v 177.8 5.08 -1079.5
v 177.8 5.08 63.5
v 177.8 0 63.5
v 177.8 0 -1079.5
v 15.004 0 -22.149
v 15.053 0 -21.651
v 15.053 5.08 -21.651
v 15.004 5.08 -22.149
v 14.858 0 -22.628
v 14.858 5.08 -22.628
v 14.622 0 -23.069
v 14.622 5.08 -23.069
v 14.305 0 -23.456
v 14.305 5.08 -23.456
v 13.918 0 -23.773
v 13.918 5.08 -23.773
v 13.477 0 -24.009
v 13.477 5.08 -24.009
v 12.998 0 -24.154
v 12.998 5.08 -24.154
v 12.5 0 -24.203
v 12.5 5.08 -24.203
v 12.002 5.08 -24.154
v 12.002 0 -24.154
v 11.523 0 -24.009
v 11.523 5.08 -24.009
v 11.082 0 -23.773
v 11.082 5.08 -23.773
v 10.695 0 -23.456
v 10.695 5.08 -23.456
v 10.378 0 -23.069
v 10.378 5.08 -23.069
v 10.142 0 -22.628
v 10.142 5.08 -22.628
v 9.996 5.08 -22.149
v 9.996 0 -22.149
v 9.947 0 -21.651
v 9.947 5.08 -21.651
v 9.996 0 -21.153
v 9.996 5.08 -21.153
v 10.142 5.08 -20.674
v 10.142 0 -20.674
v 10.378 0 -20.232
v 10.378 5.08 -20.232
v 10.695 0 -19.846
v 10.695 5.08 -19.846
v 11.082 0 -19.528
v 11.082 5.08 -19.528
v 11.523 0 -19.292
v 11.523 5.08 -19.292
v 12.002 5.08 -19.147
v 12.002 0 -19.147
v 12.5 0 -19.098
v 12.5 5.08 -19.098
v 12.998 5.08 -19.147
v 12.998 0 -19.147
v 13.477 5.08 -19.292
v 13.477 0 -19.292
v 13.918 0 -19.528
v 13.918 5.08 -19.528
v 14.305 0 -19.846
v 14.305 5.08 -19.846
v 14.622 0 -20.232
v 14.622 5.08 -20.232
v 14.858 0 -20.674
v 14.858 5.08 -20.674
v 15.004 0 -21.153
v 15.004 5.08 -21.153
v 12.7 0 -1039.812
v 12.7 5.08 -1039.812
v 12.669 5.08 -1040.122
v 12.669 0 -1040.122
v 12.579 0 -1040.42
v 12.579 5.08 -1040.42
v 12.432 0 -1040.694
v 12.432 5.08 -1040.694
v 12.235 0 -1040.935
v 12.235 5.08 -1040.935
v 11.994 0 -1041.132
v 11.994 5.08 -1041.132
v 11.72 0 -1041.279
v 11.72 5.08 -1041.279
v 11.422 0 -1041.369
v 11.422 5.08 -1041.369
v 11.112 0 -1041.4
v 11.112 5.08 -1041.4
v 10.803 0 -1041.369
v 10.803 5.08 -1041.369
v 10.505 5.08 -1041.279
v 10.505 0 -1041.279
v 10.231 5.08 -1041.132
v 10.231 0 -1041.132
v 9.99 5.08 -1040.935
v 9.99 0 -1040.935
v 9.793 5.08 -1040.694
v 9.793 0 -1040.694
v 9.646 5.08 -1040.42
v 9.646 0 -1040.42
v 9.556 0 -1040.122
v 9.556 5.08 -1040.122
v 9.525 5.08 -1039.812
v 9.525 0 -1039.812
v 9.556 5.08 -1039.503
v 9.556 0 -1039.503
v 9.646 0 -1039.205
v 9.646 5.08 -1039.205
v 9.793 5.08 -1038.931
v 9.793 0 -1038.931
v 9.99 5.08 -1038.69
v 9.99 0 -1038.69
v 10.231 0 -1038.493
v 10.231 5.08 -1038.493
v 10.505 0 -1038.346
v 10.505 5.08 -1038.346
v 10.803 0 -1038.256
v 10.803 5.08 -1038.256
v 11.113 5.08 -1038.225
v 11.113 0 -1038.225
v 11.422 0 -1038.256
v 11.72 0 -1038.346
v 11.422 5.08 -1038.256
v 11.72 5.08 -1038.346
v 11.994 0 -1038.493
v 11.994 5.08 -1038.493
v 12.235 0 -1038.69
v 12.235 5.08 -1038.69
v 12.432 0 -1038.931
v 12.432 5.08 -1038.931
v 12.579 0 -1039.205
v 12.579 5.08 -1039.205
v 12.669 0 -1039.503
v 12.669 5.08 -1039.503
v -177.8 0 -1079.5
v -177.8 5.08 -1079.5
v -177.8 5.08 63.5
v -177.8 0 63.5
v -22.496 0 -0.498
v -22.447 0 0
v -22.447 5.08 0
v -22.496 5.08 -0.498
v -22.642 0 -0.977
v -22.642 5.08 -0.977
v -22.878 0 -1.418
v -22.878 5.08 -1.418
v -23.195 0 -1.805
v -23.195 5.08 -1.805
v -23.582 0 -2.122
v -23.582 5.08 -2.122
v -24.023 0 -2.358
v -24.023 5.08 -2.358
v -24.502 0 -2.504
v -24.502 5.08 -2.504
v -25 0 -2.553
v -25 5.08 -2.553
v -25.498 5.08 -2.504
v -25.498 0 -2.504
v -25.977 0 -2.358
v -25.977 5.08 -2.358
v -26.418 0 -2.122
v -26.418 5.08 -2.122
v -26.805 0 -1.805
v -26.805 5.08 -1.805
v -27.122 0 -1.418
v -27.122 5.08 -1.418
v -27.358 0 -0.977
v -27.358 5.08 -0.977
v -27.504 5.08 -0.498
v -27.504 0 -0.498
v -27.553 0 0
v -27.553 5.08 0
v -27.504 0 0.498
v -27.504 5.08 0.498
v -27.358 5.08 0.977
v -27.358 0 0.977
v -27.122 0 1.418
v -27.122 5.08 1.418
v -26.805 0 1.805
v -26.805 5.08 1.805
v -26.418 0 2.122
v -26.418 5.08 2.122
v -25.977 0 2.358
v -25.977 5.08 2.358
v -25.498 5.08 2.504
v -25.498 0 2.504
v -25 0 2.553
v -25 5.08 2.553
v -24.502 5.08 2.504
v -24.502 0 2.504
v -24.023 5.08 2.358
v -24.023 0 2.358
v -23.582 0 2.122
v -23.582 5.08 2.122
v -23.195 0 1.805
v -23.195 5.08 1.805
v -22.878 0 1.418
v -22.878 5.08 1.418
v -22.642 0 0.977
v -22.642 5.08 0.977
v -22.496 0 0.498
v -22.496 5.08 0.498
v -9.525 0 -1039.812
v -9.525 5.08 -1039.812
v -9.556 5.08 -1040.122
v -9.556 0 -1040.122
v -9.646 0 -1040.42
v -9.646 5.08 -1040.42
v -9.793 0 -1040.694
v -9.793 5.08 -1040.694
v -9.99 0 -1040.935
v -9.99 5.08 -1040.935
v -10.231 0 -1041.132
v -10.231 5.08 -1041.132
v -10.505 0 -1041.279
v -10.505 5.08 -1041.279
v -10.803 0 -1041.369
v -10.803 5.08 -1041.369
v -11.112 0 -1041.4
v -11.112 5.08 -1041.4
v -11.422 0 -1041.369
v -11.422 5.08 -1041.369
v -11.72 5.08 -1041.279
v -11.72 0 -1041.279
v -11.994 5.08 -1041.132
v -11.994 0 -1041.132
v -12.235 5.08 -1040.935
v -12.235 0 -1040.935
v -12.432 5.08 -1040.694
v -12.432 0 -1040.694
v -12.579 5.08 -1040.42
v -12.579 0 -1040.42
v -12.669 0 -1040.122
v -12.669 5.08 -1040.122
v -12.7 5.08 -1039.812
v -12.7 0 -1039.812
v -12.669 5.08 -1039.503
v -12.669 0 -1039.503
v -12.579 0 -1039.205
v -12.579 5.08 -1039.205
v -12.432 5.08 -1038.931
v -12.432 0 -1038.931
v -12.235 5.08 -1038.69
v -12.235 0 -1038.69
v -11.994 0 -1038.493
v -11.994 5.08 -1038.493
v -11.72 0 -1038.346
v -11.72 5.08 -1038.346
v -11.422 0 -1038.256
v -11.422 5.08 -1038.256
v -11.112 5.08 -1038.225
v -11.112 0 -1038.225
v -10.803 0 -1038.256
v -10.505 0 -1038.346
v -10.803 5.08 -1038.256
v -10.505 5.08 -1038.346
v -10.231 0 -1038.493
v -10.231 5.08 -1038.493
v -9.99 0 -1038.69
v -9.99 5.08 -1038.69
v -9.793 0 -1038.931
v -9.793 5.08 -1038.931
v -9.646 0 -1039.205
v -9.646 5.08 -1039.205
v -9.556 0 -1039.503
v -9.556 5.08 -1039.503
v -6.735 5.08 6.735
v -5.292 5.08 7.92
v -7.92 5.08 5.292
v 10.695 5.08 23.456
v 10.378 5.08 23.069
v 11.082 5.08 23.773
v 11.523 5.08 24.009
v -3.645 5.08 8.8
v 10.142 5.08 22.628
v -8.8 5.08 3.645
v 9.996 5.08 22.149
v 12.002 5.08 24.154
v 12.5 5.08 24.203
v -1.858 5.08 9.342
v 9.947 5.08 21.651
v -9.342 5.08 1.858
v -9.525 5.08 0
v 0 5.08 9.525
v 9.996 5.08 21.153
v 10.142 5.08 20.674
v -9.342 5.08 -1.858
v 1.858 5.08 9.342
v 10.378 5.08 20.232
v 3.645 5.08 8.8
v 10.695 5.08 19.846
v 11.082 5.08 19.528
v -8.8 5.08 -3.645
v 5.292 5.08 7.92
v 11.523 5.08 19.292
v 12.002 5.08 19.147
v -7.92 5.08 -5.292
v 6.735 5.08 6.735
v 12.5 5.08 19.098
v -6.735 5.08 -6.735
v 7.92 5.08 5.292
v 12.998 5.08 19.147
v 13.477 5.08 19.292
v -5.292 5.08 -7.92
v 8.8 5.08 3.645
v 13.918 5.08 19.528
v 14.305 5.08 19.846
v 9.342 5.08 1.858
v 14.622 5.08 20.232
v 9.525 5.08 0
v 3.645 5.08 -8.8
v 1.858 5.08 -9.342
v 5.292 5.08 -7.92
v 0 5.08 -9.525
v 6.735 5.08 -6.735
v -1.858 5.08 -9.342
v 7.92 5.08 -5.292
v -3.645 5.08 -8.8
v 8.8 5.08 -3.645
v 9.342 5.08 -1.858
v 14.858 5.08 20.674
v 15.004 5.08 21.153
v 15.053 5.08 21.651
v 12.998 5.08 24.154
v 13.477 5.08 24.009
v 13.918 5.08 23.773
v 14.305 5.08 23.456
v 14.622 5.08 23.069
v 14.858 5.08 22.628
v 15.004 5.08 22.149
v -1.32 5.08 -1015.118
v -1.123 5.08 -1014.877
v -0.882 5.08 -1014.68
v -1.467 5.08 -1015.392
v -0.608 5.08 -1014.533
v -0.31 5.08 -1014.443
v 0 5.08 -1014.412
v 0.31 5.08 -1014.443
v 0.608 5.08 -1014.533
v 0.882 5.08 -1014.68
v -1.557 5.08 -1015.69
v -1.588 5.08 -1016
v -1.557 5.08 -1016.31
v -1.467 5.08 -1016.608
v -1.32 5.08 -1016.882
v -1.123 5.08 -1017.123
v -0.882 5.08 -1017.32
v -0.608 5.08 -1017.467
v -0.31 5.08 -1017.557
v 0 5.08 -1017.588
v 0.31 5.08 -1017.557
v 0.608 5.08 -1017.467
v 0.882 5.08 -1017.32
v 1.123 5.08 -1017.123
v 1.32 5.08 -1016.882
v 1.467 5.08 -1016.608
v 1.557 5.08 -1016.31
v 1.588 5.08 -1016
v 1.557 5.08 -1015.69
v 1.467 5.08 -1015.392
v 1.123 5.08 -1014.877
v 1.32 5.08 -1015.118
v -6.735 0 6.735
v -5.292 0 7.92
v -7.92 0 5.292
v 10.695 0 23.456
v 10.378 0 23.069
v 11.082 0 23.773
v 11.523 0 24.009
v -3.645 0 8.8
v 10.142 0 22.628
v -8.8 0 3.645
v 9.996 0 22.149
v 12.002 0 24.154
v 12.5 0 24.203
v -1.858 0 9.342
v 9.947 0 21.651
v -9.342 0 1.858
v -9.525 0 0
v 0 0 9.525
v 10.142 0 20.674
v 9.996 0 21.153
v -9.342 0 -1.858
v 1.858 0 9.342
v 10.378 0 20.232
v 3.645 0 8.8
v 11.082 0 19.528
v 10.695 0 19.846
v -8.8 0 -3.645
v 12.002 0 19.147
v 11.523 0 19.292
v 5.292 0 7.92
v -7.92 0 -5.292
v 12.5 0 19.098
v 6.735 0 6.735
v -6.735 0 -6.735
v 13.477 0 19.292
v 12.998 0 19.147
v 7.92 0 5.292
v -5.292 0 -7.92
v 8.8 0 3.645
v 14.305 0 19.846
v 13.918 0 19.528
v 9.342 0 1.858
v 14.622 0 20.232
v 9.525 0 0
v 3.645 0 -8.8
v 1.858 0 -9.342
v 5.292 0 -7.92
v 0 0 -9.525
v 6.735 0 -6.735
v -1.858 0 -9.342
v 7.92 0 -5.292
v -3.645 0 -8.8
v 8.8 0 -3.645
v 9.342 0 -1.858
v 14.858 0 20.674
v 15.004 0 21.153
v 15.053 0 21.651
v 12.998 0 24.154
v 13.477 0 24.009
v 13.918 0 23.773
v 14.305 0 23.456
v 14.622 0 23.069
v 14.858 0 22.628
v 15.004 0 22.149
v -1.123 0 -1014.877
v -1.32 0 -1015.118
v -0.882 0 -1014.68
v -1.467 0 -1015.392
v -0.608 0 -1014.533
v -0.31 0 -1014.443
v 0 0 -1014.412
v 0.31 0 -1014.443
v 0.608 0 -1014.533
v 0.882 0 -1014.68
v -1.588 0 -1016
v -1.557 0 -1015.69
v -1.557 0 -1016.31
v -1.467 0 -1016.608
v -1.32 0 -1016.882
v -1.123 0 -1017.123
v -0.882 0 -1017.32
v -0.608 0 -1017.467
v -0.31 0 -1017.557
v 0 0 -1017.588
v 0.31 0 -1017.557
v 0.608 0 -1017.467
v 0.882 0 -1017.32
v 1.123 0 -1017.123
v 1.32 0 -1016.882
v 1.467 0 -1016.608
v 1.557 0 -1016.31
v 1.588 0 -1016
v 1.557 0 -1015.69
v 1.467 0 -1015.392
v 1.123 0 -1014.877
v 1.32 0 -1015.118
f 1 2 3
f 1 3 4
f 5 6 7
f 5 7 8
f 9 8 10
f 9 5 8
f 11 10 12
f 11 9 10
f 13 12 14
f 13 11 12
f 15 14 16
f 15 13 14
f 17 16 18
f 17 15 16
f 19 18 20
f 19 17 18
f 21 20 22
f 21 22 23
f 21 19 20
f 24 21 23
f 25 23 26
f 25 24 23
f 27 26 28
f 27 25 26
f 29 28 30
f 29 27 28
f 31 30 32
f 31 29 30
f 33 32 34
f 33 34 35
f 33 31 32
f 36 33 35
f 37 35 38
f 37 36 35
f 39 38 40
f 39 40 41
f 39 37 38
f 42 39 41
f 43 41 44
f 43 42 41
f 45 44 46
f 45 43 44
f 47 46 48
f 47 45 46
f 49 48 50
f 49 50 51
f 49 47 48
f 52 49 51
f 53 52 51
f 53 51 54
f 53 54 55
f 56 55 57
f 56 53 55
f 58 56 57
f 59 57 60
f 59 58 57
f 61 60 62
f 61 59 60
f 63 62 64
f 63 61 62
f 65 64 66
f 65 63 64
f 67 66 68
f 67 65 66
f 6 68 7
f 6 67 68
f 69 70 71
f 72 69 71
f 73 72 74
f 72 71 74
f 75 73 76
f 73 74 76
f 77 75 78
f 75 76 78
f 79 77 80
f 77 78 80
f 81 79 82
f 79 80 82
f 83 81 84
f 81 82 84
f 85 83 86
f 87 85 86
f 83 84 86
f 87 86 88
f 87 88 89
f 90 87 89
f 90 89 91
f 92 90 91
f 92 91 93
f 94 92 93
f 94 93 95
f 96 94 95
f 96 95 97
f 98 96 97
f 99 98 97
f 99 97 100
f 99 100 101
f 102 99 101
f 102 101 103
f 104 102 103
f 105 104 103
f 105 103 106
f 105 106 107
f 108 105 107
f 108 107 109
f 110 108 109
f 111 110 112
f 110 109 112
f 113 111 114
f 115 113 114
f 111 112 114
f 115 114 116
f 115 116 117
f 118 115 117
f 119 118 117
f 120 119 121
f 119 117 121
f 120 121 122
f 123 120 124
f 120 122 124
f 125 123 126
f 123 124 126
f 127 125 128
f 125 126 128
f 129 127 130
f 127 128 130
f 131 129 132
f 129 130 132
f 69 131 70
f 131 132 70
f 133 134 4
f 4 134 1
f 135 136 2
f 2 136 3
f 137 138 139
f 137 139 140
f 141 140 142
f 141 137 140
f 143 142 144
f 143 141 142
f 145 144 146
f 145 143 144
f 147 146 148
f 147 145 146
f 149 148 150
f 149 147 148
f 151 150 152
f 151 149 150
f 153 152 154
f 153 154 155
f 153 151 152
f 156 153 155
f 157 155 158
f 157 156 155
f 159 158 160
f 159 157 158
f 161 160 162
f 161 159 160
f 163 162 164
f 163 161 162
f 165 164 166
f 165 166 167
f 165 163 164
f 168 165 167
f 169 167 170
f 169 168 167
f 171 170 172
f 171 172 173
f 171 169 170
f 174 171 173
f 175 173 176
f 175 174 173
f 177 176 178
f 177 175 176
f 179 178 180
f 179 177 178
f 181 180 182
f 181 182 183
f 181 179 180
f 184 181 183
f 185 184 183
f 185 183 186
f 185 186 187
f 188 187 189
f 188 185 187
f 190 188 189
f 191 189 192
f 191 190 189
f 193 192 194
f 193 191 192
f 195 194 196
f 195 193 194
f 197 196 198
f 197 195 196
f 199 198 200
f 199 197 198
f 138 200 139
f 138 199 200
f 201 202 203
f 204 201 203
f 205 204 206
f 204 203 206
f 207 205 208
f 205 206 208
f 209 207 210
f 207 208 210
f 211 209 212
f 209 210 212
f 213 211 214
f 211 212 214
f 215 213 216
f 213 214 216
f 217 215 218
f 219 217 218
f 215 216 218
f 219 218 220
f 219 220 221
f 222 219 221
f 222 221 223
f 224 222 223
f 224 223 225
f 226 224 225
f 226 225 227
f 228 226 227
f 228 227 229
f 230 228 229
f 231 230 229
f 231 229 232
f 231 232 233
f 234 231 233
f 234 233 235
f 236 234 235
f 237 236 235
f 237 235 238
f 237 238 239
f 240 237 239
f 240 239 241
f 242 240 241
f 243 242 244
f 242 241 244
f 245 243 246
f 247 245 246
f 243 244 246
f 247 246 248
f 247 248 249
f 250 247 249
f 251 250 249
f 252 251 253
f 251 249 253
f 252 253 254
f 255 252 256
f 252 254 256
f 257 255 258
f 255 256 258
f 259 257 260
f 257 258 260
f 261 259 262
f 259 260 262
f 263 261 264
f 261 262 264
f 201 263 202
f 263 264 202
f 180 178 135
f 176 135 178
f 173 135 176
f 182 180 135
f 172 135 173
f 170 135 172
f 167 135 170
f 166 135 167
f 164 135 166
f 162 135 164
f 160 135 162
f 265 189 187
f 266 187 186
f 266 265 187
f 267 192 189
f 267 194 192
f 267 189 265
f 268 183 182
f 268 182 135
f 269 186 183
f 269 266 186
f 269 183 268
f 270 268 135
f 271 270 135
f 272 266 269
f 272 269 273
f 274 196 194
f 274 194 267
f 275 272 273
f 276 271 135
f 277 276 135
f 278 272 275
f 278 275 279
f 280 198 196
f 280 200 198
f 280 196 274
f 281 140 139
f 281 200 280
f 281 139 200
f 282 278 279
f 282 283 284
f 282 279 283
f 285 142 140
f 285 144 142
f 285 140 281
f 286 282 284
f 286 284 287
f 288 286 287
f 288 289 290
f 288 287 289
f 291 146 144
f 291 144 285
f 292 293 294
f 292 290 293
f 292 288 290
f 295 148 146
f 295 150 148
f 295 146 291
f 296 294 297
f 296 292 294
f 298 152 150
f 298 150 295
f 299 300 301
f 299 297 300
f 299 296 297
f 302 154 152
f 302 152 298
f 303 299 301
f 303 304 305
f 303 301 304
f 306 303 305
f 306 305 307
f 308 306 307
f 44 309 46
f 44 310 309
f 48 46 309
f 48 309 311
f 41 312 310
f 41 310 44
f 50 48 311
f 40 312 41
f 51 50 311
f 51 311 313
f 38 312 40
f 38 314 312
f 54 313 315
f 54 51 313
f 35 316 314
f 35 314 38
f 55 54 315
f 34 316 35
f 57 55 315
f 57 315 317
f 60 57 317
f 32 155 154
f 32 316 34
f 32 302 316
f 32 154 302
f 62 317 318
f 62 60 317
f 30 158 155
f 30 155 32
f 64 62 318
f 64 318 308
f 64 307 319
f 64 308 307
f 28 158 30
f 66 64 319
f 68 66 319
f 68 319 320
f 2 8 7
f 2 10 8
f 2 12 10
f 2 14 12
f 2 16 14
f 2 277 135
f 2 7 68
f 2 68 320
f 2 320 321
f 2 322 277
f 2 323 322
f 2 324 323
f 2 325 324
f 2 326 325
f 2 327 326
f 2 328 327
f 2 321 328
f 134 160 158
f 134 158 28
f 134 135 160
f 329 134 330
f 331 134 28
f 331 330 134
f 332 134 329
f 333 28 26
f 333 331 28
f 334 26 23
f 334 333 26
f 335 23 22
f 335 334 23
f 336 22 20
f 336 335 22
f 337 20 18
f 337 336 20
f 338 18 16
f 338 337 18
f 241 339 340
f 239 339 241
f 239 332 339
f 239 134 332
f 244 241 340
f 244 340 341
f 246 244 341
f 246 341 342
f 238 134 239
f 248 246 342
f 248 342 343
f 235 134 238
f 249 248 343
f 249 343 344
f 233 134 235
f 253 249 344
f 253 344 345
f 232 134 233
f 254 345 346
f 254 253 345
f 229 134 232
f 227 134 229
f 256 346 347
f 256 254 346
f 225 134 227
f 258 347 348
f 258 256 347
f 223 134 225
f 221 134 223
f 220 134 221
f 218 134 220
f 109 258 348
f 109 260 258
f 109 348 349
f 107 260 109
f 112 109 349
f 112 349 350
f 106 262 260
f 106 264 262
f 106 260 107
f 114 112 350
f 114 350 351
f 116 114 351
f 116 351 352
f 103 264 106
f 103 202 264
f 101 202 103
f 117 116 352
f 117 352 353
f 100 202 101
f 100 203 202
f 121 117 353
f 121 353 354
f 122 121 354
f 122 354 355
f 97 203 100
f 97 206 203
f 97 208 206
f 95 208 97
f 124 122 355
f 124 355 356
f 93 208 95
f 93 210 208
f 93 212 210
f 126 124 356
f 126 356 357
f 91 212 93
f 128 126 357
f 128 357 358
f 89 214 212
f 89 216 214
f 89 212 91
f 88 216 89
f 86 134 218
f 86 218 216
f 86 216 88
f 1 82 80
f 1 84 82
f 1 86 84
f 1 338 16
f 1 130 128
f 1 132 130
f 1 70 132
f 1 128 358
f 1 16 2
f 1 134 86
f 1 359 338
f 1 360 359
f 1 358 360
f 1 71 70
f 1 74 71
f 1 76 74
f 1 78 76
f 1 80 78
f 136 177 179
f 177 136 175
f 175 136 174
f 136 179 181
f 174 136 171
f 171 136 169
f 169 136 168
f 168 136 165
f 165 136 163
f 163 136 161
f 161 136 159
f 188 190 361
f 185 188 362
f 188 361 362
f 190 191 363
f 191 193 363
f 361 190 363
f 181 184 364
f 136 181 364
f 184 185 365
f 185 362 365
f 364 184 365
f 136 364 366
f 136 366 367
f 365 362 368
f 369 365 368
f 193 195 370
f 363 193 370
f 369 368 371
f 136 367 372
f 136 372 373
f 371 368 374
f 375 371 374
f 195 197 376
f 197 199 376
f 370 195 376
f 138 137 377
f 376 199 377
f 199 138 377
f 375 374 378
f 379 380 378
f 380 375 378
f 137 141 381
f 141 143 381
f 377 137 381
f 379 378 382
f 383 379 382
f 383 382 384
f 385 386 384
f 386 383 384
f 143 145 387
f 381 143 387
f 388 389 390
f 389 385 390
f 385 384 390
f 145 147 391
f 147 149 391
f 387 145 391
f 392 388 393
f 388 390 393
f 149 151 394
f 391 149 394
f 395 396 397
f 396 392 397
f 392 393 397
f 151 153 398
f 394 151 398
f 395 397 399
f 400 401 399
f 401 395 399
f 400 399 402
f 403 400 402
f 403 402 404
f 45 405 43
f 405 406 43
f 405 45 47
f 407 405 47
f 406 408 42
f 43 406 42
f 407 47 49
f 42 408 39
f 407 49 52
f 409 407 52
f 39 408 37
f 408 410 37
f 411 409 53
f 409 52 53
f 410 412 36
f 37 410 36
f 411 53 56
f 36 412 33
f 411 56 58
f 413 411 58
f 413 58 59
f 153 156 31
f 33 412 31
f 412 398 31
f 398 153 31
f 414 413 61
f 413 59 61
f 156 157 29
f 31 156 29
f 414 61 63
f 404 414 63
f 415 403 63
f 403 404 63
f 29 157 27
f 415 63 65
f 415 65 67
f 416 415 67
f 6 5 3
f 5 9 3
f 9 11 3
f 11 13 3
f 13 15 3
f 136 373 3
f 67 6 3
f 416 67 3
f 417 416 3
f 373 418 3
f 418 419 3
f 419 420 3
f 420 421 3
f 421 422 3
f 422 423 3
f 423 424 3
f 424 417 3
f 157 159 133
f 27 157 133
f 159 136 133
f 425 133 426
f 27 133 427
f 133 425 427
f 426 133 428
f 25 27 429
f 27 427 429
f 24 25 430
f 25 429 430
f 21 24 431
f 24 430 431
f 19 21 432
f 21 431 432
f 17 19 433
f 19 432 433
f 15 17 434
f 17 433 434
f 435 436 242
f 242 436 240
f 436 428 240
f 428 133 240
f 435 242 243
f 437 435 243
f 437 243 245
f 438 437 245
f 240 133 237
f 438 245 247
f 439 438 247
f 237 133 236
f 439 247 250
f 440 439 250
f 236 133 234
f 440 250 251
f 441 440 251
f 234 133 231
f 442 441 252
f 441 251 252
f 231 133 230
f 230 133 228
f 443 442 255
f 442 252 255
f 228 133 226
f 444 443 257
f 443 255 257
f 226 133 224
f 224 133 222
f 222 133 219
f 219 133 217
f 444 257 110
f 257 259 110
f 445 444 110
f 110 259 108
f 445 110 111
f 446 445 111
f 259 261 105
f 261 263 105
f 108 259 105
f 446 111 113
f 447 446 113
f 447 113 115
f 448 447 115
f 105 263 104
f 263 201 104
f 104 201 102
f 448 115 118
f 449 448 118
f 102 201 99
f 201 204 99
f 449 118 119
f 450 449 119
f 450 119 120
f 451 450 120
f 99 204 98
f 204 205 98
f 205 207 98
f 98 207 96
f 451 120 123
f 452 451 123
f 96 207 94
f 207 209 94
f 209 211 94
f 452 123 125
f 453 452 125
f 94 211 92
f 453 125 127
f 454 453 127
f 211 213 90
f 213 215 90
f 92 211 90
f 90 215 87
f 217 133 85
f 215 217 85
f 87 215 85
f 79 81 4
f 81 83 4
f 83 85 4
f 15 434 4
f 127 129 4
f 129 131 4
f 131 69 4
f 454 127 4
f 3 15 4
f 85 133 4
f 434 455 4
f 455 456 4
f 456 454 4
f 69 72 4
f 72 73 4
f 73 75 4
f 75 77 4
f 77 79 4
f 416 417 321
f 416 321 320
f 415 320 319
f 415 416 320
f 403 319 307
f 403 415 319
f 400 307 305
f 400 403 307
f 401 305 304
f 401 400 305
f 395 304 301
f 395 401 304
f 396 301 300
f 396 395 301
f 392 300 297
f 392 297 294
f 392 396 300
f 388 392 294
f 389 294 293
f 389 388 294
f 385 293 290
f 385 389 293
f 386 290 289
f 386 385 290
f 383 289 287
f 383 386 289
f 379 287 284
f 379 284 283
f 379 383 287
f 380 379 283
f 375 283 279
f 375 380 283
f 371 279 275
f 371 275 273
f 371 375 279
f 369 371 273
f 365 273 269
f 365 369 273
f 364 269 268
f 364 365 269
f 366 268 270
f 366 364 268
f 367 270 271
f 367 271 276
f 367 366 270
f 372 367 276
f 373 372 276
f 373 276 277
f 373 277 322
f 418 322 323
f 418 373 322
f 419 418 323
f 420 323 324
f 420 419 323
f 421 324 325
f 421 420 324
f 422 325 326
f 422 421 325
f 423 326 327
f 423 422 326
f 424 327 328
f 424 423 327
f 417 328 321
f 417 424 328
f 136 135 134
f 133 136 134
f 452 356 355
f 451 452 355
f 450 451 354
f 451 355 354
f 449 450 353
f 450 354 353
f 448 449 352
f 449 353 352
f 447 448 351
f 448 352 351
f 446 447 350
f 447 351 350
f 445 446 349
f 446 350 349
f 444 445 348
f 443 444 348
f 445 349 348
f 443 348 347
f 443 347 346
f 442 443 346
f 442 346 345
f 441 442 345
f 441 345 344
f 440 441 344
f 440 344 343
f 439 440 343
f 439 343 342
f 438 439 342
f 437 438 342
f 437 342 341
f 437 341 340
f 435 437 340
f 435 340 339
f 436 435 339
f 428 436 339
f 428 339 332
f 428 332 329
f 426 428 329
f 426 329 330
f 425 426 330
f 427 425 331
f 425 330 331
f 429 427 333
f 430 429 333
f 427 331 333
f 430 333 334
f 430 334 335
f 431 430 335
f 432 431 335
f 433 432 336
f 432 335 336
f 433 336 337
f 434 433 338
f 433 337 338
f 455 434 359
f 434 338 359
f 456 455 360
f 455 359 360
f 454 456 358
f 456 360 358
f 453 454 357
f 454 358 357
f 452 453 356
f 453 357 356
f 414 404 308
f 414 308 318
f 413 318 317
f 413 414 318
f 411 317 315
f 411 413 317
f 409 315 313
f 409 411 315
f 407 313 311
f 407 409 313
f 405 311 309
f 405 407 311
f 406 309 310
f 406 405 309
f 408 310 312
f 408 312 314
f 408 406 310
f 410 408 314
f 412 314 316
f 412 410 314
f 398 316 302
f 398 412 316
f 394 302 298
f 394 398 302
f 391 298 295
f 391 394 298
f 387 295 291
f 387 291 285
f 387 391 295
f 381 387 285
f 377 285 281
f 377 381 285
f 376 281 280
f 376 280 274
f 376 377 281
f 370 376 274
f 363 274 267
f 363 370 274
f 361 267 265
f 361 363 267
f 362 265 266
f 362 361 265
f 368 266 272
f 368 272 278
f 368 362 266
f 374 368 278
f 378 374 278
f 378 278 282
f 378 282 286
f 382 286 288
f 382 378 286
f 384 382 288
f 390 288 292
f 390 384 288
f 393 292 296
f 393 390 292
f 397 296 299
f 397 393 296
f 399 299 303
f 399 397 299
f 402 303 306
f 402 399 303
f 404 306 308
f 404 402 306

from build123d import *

# Parameters (mm, degrees)
SKETCH1_W           = 355.6
SKETCH1_H           = 127
SKETCH1_R           = 9.525
SKETCH1_R_2         = 2.5527
BOSS_EXTRUDE1_DEPTH = 5.08
SKETCH2_W           = 355.6
SKETCH2_H           = 1016
BOSS_EXTRUDE2_DEPTH = 5.08
SKETCH4_R           = 1.5875
CUT_EXTRUDE1_DEPTH  = 6.08


with BuildPart() as part:
    # Sketch1 → Boss-Extrude1 (new body)
    with BuildSketch(Plane(origin=(0, 0, 0), x_dir=(1, 0, 0), z_dir=(0, 1, 0))):
        Rectangle(SKETCH1_W, SKETCH1_H)
        Circle(SKETCH1_R, mode=Mode.SUBTRACT)
        with Locations((12.5, 21.650635095)):
            Circle(SKETCH1_R_2, mode=Mode.SUBTRACT)
        with Locations((12.5, -21.650635095)):
            Circle(SKETCH1_R_2, mode=Mode.SUBTRACT)
        with Locations((-25, 0)):
            Circle(SKETCH1_R_2, mode=Mode.SUBTRACT)
    extrude(amount=BOSS_EXTRUDE1_DEPTH)

    # Sketch2 → Boss-Extrude2 (add)
    with BuildSketch(Plane(origin=(0, 5.08, 0), x_dir=(1, 0, 0), z_dir=(0, 1, 0))):
        with Locations((0, 571.5)):
            Rectangle(SKETCH2_W, SKETCH2_H)
    extrude(amount=-BOSS_EXTRUDE2_DEPTH)

    # Sketch4 → Cut-Extrude1 (cut, through all)
    with BuildSketch(Plane(origin=(0, 5.08, 0), x_dir=(1, 0, 0), z_dir=(0, 1, 0))):
        with Locations((11.1125, 1039.8125)):
            Circle(SKETCH4_R)
        with Locations((-11.1125, 1039.8125)):
            Circle(SKETCH4_R)
        with Locations((0, 1016)):
            Circle(SKETCH4_R)
    extrude(amount=-CUT_EXTRUDE1_DEPTH, mode=Mode.SUBTRACT)


solid = part.part
